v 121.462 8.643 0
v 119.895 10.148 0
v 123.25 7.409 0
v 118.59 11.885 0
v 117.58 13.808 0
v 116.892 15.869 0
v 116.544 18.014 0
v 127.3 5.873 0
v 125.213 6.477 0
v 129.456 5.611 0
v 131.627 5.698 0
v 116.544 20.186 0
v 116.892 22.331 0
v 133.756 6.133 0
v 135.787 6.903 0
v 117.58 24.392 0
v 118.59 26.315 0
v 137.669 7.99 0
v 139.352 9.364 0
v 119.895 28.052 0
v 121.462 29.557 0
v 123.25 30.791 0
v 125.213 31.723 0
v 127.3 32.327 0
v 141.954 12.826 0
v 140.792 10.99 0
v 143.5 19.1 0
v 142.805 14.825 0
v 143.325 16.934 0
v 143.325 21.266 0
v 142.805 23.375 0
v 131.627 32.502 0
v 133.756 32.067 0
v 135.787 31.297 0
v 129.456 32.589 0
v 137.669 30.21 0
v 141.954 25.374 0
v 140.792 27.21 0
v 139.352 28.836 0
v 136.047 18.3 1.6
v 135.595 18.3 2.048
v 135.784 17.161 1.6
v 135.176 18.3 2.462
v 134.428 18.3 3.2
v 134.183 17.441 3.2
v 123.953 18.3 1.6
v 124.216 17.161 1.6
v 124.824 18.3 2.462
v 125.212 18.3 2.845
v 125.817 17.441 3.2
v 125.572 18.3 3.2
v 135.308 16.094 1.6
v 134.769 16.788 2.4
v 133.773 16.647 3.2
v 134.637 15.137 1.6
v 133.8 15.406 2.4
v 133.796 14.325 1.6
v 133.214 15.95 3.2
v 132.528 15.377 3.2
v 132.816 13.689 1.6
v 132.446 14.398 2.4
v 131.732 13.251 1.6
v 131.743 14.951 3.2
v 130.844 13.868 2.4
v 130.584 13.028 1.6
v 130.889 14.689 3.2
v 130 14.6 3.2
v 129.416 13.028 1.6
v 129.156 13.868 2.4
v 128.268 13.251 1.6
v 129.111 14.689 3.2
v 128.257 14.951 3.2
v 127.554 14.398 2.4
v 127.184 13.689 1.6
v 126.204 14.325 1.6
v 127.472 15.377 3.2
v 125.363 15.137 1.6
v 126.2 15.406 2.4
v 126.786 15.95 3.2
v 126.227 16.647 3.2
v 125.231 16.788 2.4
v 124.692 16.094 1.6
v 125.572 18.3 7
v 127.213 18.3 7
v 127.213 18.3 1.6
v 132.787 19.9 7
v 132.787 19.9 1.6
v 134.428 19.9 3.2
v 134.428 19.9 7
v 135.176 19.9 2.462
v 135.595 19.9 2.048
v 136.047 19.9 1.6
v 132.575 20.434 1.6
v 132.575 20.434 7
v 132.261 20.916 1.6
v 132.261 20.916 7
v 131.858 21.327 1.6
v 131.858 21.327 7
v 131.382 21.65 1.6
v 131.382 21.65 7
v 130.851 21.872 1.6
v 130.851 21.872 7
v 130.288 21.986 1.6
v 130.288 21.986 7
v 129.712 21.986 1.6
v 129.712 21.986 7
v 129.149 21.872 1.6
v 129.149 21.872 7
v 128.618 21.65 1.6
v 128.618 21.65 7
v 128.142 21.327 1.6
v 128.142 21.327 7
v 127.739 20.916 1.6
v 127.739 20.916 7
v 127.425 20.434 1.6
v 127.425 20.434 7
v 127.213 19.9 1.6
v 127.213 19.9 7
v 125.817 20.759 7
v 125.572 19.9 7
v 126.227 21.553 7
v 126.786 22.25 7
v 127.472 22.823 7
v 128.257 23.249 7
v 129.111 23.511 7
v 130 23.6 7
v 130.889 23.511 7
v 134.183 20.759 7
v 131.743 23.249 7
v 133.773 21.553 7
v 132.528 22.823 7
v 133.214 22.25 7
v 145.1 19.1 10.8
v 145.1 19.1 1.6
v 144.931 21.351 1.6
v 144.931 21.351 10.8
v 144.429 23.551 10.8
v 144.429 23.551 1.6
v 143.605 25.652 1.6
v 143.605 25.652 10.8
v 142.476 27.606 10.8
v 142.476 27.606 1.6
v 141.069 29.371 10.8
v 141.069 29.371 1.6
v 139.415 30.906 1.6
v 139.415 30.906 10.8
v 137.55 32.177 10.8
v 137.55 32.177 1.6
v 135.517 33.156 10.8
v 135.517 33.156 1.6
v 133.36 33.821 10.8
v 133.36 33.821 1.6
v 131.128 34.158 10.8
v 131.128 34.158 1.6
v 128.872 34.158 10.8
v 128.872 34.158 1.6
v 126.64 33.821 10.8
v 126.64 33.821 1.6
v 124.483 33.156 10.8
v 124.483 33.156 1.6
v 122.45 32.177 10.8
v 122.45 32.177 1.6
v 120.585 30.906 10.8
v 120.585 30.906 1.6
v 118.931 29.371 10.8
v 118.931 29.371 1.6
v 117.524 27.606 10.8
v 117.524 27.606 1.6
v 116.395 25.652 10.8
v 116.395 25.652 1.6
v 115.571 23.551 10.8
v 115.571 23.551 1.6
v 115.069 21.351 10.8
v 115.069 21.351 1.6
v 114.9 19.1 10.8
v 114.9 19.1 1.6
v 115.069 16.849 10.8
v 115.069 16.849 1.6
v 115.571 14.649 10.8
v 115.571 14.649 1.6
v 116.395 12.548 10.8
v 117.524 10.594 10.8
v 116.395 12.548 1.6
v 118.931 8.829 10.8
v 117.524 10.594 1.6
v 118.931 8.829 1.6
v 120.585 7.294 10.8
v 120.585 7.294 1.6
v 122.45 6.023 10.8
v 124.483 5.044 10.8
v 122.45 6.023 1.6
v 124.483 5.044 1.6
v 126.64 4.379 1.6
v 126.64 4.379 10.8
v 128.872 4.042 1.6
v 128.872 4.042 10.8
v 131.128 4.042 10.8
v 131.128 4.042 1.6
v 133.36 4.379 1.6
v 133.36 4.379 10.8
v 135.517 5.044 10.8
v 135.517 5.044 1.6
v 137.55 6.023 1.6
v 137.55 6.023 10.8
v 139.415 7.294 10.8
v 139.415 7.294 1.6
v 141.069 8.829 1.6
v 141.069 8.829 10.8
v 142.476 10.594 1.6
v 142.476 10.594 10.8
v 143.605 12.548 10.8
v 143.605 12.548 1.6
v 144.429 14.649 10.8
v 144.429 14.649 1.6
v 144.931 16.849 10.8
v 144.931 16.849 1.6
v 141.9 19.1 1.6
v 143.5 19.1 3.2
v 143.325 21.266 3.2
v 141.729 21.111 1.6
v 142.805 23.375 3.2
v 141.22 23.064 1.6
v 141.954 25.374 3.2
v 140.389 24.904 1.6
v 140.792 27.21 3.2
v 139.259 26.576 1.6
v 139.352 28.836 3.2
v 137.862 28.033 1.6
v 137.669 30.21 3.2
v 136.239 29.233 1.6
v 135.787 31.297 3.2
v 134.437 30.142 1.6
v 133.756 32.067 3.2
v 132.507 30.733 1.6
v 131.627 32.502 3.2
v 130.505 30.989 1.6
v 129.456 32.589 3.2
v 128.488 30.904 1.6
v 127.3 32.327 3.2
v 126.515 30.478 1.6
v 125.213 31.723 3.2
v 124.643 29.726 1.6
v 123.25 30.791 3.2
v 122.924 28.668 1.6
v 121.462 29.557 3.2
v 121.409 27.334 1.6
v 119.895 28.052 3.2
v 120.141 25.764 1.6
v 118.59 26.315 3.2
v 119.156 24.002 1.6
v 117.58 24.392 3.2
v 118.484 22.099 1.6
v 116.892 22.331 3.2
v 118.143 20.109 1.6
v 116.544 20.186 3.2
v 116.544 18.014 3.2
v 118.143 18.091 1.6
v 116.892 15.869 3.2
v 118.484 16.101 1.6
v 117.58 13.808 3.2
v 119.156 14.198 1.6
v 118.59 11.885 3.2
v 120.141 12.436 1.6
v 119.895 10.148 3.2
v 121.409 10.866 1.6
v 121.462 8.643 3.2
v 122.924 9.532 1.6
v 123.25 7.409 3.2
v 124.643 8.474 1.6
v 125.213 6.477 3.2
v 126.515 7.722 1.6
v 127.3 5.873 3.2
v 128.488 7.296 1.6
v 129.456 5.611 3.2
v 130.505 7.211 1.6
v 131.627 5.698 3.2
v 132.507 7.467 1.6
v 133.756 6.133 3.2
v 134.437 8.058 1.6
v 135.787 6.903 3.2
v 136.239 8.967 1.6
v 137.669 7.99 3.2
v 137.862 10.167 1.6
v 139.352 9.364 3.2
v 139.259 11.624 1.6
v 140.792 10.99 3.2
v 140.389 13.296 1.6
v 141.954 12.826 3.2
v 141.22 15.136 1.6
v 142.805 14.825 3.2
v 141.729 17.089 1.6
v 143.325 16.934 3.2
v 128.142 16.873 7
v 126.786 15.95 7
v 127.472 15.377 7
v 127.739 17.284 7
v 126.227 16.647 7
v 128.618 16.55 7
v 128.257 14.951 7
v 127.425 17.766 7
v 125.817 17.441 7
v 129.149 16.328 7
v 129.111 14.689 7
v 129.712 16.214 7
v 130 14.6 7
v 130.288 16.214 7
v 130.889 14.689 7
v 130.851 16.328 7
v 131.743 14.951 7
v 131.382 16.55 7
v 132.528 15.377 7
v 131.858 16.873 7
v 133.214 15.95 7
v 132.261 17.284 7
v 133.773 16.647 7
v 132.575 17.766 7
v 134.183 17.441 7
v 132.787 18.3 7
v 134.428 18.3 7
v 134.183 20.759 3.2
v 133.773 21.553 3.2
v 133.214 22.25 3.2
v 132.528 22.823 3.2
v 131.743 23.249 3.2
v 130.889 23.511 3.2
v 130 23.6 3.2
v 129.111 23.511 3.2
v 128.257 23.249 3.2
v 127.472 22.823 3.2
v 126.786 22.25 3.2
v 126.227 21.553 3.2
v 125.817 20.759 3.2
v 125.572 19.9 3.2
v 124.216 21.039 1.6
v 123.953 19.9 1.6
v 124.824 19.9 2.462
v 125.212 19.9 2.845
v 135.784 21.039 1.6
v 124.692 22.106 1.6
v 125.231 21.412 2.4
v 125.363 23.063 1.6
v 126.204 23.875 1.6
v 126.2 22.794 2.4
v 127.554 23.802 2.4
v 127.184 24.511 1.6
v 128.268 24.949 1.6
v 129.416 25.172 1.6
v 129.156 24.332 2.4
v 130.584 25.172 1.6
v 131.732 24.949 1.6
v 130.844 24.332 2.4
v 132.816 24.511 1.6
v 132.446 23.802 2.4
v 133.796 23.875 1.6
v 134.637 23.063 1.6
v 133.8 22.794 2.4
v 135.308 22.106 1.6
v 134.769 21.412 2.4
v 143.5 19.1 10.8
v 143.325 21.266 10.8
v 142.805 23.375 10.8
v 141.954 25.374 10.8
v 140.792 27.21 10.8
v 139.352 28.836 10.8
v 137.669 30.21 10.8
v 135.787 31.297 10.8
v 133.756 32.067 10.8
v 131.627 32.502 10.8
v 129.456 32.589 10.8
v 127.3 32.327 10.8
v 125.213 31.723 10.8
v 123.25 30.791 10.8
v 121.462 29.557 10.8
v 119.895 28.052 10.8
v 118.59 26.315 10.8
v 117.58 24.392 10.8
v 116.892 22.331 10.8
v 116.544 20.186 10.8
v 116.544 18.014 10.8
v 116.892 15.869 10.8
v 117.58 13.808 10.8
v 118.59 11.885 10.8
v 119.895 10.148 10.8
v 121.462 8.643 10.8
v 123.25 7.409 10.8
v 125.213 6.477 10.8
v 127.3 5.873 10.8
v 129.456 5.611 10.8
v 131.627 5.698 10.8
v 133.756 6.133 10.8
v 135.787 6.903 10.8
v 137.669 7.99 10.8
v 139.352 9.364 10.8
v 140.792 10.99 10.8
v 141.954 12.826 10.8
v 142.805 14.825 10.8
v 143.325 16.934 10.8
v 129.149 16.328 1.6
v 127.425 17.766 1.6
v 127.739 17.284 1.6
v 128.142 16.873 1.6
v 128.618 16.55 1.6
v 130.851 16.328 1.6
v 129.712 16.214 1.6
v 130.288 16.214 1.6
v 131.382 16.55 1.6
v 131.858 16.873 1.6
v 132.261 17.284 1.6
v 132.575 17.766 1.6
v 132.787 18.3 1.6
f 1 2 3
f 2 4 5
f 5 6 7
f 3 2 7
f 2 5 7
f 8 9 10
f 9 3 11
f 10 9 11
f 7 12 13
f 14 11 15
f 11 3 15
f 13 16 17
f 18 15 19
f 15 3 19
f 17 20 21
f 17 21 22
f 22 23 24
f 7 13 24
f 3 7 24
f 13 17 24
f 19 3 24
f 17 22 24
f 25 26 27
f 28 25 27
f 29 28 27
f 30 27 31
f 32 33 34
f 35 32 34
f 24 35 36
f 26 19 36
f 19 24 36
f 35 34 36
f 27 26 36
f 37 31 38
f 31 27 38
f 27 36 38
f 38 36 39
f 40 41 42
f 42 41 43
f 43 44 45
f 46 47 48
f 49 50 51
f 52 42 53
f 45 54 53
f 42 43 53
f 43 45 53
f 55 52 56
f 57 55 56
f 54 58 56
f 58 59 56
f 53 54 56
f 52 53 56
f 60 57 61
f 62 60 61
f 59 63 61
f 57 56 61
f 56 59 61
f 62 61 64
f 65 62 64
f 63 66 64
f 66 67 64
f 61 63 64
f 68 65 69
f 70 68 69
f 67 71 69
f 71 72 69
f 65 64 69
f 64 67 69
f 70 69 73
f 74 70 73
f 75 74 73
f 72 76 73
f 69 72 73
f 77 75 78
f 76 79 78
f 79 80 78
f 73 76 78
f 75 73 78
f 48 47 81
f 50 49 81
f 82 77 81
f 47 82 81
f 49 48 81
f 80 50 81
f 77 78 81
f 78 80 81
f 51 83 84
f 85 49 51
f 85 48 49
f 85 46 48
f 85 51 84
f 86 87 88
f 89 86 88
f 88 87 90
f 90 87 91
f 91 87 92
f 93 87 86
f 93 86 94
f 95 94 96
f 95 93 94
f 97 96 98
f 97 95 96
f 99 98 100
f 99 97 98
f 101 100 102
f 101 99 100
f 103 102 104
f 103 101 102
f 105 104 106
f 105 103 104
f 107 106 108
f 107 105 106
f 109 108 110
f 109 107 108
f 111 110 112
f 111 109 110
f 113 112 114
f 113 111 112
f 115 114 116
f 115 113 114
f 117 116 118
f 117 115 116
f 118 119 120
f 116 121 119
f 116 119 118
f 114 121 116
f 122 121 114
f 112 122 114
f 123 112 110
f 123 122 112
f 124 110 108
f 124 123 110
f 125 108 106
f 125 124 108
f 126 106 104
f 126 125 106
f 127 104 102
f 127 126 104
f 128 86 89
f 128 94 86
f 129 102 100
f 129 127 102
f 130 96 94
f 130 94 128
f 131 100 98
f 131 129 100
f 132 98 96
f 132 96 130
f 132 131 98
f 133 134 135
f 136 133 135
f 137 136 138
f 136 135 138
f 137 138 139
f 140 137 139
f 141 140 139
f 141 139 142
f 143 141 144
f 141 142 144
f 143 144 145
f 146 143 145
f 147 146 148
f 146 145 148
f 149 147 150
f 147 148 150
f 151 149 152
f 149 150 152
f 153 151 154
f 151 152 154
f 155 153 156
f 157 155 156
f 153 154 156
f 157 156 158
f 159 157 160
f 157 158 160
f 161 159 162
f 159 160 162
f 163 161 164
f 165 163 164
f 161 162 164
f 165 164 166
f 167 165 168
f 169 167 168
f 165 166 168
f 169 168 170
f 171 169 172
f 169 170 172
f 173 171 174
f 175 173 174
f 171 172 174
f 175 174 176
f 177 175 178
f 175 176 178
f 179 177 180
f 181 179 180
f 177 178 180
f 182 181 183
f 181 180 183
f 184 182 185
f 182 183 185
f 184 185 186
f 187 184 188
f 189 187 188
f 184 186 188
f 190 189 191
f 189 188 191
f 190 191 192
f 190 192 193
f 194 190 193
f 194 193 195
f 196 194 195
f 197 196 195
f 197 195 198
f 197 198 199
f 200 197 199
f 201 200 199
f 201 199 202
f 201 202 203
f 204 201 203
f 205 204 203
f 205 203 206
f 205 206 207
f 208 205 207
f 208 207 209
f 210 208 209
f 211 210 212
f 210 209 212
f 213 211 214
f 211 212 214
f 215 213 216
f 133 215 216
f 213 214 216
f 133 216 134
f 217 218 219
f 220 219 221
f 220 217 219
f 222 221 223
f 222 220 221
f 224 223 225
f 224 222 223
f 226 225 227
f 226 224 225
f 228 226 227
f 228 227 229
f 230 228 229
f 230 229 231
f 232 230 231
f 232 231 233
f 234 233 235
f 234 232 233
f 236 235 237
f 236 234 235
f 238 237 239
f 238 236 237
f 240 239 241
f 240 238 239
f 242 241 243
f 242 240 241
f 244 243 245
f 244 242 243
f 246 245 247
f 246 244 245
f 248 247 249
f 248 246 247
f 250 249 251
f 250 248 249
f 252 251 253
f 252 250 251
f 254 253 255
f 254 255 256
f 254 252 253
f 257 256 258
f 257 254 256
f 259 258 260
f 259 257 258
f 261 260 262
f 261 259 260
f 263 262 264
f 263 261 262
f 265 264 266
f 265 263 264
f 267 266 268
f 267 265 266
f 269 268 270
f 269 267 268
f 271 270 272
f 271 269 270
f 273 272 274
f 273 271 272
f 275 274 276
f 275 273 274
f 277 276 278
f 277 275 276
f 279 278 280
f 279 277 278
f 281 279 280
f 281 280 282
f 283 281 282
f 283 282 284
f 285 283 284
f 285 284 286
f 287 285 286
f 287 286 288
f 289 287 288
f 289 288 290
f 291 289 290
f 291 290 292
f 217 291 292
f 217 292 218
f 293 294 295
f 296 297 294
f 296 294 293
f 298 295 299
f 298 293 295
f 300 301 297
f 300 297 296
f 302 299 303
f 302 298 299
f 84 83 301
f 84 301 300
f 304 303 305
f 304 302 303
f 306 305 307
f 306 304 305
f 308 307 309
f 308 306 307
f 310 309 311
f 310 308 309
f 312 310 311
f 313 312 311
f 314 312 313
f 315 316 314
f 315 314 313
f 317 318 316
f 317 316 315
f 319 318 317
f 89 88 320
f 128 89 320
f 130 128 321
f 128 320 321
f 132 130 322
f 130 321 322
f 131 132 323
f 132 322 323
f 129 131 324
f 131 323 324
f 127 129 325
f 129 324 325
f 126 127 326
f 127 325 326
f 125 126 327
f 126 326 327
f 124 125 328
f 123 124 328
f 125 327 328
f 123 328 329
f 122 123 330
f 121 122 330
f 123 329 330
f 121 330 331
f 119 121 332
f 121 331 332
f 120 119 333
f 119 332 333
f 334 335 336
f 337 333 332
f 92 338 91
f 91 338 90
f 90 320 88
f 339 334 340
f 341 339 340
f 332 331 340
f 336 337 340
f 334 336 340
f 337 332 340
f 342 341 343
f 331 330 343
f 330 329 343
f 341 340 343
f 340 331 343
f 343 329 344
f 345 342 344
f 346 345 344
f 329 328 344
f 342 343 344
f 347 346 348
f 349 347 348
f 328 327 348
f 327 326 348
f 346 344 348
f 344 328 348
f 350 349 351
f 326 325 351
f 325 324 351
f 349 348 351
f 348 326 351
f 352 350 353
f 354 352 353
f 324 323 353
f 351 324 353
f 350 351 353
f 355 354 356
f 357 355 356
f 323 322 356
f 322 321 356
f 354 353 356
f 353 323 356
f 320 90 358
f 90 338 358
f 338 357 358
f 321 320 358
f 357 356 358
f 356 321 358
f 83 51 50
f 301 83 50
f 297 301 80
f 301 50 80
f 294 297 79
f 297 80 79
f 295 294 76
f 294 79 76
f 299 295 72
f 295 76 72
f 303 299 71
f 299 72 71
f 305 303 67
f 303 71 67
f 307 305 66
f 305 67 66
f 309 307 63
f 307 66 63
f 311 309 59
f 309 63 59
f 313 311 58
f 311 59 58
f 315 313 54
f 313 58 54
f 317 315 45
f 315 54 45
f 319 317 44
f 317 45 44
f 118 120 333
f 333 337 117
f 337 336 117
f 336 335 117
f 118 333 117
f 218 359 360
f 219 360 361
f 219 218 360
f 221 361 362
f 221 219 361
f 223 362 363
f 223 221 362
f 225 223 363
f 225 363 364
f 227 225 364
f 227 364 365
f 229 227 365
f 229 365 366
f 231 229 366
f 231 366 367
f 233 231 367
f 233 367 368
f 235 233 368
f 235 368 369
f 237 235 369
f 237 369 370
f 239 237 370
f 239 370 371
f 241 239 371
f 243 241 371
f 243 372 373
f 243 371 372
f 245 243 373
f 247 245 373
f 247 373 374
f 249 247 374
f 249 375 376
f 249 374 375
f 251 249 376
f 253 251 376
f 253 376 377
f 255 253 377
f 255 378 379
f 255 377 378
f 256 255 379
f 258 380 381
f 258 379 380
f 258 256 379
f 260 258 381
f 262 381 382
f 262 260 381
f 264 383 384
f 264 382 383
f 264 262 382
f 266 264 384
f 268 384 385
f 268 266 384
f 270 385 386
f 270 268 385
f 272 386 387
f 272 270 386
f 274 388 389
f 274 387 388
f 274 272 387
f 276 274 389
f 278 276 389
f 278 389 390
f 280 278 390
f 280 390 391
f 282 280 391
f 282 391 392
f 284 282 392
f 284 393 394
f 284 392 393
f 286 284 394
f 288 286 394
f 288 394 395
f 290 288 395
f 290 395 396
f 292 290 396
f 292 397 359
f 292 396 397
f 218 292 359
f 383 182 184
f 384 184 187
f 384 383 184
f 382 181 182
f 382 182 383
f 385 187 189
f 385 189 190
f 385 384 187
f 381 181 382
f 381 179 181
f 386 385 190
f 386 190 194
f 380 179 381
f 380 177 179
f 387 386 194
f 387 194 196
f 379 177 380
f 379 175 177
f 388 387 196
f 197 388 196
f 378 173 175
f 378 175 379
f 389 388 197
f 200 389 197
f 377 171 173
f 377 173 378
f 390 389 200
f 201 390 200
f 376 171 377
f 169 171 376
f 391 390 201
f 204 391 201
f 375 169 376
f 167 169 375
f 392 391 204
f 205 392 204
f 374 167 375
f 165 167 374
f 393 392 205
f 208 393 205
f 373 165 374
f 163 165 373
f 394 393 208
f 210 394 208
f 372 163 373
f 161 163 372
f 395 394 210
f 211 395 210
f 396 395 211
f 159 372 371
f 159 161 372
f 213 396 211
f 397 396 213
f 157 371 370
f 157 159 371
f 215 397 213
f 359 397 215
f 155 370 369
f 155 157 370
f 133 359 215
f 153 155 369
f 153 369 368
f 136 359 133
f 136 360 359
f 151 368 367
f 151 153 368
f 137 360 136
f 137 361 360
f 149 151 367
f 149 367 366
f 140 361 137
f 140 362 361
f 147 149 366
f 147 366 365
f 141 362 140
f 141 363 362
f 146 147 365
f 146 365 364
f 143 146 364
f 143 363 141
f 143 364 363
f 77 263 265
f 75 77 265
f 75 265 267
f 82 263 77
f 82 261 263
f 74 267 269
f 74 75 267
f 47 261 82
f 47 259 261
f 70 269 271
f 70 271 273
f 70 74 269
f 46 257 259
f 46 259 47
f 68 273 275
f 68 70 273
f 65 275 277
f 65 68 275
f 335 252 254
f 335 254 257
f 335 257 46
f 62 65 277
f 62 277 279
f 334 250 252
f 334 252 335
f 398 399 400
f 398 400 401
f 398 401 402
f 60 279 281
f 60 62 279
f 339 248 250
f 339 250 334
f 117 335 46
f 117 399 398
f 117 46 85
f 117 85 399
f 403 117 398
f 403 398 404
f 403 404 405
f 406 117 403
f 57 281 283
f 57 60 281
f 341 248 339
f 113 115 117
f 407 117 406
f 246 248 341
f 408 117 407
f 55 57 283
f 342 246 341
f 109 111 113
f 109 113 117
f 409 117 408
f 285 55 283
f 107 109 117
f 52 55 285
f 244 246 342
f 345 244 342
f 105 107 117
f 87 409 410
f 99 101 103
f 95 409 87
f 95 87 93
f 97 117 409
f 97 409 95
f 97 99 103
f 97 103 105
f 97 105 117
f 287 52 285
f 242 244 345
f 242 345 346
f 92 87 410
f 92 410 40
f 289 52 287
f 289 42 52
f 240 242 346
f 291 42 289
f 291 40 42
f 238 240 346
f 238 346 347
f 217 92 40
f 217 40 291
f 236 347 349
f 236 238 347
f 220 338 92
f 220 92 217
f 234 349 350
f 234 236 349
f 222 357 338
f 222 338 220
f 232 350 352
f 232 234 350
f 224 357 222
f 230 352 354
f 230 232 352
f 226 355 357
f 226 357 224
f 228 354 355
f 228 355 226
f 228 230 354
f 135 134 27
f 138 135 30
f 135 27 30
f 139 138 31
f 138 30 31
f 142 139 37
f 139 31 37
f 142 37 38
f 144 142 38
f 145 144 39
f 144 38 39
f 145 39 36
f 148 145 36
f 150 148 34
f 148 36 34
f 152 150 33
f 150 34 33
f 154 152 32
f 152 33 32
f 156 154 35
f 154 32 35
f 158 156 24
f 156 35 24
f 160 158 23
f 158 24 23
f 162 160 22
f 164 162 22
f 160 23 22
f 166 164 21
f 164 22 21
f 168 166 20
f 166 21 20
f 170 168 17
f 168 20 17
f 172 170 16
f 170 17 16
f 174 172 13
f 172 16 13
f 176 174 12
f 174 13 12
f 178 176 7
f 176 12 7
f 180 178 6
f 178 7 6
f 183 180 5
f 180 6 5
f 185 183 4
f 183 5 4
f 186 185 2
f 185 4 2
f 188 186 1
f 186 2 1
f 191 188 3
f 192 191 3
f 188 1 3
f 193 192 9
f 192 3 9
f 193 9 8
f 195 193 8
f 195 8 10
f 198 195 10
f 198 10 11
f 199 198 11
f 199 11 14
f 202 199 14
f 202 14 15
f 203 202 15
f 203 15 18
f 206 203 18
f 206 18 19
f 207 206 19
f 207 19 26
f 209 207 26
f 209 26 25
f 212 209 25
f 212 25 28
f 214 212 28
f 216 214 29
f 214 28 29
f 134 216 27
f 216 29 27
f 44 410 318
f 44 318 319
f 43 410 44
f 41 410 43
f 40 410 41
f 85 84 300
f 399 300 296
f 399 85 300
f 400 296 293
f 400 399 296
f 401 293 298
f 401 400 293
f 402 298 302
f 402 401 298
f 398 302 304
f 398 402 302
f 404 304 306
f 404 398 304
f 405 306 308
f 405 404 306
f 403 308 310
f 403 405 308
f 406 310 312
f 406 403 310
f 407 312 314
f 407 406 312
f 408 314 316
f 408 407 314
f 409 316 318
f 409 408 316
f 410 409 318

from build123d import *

# Parameters (mm, degrees)
BOX009_W          = 15
BOX009_H          = 1.6
BOX009_DEPTH      = 10.5
CYLINDER019_R     = 2.9
CYLINDER019_DEPTH = 10.5
CYLINDER018_R     = 4.5
CYLINDER018_DEPTH = 7
CYLINDER017_R     = 13.5
CYLINDER017_DEPTH = 10.8
CYLINDER016_R     = 15.1
CYLINDER016_DEPTH = 10.8
CHAMFER006_SIZE   = 1.6
CHAMFER007_SIZE   = 1.6
CHAMFER008_SIZE   = 1.6


with BuildPart() as w_rfel009:
    # Box009 → Box009 (new body)
    with BuildSketch(Plane(origin=(123, 18.3, 1.6), x_dir=(1, 0, 0), z_dir=(0, 0, 1))):
        with Locations((7.5, 0.8)):
            Rectangle(BOX009_W, BOX009_H)
    extrude(amount=BOX009_DEPTH)


with BuildPart() as zylinder019:
    # Cylinder019 → Cylinder019 (new body)
    with BuildSketch(Plane(origin=(130, 19.1, 1.6), x_dir=(1, 0, 0), z_dir=(0, 0, 1))):
        Circle(CYLINDER019_R)
    extrude(amount=CYLINDER019_DEPTH)


with BuildPart() as cut009:
    # Cylinder018 → Cylinder018 (new body)
    with BuildSketch(Plane(origin=(130, 19.1, 0), x_dir=(1, 0, 0), z_dir=(0, 0, 1))):
        Circle(CYLINDER018_R)
    extrude(amount=CYLINDER018_DEPTH)

    # Cut009: cut Zylinder019
    add(zylinder019.part, mode=Mode.SUBTRACT)


with BuildPart() as zylinder017:
    # Cylinder017 → Cylinder017 (new body)
    with BuildSketch(Plane(origin=(130, 19.1, 1.6), x_dir=(1, 0, 0), z_dir=(0, 0, 1))):
        Circle(CYLINDER017_R)
    extrude(amount=CYLINDER017_DEPTH)


with BuildPart() as knob:
    # Cylinder016 → Cylinder016 (new body)
    with BuildSketch(Plane(origin=(130, 19.1, 0), x_dir=(1, 0, 0), z_dir=(0, 0, 1))):
        Circle(CYLINDER016_R)
    extrude(amount=CYLINDER016_DEPTH)

    # Cut008: cut Zylinder017
    add(zylinder017.part, mode=Mode.SUBTRACT)

    # Chamfer006
    chamfer006_edges = [knob.edges().sort_by_distance(p)[0] for p in [
        (116.5, 19.1, 1.6),
    ]]
    chamfer(chamfer006_edges, length=CHAMFER006_SIZE)

    # Chamfer007
    chamfer007_edges = [knob.edges().sort_by_distance(p)[0] for p in [
        (114.9, 19.1, 0),
    ]]
    chamfer(chamfer007_edges, length=CHAMFER007_SIZE)

    # Fusion011: union Cut009
    add(cut009.part)

    # Chamfer008
    chamfer008_edges = [knob.edges().sort_by_distance(p)[0] for p in [
        (125.5, 19.1, 1.6),
    ]]
    chamfer(chamfer008_edges, length=CHAMFER008_SIZE)

    # Cut010: cut Würfel009
    add(w_rfel009.part, mode=Mode.SUBTRACT)


solid = knob.part
